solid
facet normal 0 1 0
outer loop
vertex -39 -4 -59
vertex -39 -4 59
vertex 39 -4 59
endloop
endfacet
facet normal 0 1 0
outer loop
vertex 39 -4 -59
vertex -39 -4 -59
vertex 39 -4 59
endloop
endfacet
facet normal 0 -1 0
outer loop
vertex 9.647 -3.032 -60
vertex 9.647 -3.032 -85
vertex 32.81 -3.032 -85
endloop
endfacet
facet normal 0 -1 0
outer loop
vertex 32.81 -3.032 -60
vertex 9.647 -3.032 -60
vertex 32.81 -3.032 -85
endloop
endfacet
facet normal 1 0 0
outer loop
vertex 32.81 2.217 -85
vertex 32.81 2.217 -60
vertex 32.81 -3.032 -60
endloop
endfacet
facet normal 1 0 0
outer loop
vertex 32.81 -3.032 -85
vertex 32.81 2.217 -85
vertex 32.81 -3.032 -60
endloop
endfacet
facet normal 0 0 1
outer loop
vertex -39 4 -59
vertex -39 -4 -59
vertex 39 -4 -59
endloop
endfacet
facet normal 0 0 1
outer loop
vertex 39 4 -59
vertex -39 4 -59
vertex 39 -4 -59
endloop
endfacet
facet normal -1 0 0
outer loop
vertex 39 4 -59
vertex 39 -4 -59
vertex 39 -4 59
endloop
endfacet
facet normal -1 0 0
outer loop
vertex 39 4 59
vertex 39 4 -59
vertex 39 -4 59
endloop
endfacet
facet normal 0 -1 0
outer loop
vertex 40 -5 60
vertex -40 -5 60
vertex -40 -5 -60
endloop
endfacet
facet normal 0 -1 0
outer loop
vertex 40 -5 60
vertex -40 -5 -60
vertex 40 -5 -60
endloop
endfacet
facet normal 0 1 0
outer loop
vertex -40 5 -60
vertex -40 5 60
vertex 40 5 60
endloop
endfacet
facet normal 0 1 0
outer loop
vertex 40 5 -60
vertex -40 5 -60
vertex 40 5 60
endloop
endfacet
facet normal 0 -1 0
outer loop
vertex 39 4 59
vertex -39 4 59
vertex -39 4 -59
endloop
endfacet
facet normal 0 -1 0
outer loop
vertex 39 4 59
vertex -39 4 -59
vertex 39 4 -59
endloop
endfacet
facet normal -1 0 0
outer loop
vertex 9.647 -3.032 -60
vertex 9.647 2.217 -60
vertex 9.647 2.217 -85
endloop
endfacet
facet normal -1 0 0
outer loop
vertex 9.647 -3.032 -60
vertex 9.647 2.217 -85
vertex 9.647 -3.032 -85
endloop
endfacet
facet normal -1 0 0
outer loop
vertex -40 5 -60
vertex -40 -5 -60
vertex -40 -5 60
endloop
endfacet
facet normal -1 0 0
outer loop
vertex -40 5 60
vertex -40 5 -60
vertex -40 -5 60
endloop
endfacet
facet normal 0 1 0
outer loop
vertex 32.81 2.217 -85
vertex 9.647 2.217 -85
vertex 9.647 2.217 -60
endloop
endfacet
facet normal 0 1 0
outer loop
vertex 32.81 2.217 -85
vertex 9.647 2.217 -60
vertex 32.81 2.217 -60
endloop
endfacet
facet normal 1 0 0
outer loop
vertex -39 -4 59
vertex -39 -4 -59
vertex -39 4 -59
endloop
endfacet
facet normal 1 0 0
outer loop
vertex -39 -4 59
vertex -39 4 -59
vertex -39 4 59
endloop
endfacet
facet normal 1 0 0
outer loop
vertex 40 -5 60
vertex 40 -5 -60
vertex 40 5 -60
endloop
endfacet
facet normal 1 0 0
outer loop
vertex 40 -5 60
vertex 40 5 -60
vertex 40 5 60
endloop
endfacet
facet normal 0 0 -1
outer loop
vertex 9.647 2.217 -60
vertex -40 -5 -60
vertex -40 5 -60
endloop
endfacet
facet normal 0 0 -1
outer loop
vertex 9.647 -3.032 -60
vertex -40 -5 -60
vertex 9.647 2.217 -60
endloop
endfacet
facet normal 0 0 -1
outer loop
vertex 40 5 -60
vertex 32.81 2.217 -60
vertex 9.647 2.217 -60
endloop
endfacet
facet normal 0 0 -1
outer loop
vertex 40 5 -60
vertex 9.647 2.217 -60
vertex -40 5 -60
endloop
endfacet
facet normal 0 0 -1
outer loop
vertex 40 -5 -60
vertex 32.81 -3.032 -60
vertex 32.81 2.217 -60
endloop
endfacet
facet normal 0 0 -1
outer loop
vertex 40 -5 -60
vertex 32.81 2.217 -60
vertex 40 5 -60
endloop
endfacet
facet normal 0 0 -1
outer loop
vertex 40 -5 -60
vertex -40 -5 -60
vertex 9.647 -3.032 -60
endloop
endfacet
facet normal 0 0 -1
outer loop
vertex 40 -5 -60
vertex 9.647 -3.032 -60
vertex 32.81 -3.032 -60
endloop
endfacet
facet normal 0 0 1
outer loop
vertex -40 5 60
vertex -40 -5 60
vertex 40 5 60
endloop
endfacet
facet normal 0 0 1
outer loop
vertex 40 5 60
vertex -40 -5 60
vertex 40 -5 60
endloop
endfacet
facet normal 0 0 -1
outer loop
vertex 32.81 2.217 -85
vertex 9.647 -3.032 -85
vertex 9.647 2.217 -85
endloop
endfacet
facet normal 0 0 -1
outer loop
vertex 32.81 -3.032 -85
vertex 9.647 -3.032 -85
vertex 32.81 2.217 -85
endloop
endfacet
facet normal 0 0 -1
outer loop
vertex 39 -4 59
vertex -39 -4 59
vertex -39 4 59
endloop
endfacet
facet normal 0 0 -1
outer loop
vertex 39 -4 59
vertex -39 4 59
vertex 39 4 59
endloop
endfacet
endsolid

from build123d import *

# Parameters (mm, degrees)
F0_W     = 80
F0_H     = 120
F1_DEPTH = 5
F2_T     = -1
F3_W     = 23.1627868488
F3_H     = 5.2490865346
F4_DEPTH = 25


with BuildPart() as f1:
    # F0 (on Front) → F1 (new body, symmetric)
    with BuildSketch(Plane.XZ):
        Rectangle(F0_W, F0_H)
    extrude(amount=F1_DEPTH, both=True)

    # F2 (hollow: no face is removed)
    offset(amount=F2_T, mode=Mode.SUBTRACT)

    # F3 (on face) → F4 (join)
    with BuildSketch(Plane(origin=(0, 0, -60), x_dir=(1, 0, 0), z_dir=(0, 0, -1))):
        with Locations((21.2281174026, 0.4071515286)):
            Rectangle(F3_W, F3_H)
    extrude(amount=F4_DEPTH)


solid = f1.part
